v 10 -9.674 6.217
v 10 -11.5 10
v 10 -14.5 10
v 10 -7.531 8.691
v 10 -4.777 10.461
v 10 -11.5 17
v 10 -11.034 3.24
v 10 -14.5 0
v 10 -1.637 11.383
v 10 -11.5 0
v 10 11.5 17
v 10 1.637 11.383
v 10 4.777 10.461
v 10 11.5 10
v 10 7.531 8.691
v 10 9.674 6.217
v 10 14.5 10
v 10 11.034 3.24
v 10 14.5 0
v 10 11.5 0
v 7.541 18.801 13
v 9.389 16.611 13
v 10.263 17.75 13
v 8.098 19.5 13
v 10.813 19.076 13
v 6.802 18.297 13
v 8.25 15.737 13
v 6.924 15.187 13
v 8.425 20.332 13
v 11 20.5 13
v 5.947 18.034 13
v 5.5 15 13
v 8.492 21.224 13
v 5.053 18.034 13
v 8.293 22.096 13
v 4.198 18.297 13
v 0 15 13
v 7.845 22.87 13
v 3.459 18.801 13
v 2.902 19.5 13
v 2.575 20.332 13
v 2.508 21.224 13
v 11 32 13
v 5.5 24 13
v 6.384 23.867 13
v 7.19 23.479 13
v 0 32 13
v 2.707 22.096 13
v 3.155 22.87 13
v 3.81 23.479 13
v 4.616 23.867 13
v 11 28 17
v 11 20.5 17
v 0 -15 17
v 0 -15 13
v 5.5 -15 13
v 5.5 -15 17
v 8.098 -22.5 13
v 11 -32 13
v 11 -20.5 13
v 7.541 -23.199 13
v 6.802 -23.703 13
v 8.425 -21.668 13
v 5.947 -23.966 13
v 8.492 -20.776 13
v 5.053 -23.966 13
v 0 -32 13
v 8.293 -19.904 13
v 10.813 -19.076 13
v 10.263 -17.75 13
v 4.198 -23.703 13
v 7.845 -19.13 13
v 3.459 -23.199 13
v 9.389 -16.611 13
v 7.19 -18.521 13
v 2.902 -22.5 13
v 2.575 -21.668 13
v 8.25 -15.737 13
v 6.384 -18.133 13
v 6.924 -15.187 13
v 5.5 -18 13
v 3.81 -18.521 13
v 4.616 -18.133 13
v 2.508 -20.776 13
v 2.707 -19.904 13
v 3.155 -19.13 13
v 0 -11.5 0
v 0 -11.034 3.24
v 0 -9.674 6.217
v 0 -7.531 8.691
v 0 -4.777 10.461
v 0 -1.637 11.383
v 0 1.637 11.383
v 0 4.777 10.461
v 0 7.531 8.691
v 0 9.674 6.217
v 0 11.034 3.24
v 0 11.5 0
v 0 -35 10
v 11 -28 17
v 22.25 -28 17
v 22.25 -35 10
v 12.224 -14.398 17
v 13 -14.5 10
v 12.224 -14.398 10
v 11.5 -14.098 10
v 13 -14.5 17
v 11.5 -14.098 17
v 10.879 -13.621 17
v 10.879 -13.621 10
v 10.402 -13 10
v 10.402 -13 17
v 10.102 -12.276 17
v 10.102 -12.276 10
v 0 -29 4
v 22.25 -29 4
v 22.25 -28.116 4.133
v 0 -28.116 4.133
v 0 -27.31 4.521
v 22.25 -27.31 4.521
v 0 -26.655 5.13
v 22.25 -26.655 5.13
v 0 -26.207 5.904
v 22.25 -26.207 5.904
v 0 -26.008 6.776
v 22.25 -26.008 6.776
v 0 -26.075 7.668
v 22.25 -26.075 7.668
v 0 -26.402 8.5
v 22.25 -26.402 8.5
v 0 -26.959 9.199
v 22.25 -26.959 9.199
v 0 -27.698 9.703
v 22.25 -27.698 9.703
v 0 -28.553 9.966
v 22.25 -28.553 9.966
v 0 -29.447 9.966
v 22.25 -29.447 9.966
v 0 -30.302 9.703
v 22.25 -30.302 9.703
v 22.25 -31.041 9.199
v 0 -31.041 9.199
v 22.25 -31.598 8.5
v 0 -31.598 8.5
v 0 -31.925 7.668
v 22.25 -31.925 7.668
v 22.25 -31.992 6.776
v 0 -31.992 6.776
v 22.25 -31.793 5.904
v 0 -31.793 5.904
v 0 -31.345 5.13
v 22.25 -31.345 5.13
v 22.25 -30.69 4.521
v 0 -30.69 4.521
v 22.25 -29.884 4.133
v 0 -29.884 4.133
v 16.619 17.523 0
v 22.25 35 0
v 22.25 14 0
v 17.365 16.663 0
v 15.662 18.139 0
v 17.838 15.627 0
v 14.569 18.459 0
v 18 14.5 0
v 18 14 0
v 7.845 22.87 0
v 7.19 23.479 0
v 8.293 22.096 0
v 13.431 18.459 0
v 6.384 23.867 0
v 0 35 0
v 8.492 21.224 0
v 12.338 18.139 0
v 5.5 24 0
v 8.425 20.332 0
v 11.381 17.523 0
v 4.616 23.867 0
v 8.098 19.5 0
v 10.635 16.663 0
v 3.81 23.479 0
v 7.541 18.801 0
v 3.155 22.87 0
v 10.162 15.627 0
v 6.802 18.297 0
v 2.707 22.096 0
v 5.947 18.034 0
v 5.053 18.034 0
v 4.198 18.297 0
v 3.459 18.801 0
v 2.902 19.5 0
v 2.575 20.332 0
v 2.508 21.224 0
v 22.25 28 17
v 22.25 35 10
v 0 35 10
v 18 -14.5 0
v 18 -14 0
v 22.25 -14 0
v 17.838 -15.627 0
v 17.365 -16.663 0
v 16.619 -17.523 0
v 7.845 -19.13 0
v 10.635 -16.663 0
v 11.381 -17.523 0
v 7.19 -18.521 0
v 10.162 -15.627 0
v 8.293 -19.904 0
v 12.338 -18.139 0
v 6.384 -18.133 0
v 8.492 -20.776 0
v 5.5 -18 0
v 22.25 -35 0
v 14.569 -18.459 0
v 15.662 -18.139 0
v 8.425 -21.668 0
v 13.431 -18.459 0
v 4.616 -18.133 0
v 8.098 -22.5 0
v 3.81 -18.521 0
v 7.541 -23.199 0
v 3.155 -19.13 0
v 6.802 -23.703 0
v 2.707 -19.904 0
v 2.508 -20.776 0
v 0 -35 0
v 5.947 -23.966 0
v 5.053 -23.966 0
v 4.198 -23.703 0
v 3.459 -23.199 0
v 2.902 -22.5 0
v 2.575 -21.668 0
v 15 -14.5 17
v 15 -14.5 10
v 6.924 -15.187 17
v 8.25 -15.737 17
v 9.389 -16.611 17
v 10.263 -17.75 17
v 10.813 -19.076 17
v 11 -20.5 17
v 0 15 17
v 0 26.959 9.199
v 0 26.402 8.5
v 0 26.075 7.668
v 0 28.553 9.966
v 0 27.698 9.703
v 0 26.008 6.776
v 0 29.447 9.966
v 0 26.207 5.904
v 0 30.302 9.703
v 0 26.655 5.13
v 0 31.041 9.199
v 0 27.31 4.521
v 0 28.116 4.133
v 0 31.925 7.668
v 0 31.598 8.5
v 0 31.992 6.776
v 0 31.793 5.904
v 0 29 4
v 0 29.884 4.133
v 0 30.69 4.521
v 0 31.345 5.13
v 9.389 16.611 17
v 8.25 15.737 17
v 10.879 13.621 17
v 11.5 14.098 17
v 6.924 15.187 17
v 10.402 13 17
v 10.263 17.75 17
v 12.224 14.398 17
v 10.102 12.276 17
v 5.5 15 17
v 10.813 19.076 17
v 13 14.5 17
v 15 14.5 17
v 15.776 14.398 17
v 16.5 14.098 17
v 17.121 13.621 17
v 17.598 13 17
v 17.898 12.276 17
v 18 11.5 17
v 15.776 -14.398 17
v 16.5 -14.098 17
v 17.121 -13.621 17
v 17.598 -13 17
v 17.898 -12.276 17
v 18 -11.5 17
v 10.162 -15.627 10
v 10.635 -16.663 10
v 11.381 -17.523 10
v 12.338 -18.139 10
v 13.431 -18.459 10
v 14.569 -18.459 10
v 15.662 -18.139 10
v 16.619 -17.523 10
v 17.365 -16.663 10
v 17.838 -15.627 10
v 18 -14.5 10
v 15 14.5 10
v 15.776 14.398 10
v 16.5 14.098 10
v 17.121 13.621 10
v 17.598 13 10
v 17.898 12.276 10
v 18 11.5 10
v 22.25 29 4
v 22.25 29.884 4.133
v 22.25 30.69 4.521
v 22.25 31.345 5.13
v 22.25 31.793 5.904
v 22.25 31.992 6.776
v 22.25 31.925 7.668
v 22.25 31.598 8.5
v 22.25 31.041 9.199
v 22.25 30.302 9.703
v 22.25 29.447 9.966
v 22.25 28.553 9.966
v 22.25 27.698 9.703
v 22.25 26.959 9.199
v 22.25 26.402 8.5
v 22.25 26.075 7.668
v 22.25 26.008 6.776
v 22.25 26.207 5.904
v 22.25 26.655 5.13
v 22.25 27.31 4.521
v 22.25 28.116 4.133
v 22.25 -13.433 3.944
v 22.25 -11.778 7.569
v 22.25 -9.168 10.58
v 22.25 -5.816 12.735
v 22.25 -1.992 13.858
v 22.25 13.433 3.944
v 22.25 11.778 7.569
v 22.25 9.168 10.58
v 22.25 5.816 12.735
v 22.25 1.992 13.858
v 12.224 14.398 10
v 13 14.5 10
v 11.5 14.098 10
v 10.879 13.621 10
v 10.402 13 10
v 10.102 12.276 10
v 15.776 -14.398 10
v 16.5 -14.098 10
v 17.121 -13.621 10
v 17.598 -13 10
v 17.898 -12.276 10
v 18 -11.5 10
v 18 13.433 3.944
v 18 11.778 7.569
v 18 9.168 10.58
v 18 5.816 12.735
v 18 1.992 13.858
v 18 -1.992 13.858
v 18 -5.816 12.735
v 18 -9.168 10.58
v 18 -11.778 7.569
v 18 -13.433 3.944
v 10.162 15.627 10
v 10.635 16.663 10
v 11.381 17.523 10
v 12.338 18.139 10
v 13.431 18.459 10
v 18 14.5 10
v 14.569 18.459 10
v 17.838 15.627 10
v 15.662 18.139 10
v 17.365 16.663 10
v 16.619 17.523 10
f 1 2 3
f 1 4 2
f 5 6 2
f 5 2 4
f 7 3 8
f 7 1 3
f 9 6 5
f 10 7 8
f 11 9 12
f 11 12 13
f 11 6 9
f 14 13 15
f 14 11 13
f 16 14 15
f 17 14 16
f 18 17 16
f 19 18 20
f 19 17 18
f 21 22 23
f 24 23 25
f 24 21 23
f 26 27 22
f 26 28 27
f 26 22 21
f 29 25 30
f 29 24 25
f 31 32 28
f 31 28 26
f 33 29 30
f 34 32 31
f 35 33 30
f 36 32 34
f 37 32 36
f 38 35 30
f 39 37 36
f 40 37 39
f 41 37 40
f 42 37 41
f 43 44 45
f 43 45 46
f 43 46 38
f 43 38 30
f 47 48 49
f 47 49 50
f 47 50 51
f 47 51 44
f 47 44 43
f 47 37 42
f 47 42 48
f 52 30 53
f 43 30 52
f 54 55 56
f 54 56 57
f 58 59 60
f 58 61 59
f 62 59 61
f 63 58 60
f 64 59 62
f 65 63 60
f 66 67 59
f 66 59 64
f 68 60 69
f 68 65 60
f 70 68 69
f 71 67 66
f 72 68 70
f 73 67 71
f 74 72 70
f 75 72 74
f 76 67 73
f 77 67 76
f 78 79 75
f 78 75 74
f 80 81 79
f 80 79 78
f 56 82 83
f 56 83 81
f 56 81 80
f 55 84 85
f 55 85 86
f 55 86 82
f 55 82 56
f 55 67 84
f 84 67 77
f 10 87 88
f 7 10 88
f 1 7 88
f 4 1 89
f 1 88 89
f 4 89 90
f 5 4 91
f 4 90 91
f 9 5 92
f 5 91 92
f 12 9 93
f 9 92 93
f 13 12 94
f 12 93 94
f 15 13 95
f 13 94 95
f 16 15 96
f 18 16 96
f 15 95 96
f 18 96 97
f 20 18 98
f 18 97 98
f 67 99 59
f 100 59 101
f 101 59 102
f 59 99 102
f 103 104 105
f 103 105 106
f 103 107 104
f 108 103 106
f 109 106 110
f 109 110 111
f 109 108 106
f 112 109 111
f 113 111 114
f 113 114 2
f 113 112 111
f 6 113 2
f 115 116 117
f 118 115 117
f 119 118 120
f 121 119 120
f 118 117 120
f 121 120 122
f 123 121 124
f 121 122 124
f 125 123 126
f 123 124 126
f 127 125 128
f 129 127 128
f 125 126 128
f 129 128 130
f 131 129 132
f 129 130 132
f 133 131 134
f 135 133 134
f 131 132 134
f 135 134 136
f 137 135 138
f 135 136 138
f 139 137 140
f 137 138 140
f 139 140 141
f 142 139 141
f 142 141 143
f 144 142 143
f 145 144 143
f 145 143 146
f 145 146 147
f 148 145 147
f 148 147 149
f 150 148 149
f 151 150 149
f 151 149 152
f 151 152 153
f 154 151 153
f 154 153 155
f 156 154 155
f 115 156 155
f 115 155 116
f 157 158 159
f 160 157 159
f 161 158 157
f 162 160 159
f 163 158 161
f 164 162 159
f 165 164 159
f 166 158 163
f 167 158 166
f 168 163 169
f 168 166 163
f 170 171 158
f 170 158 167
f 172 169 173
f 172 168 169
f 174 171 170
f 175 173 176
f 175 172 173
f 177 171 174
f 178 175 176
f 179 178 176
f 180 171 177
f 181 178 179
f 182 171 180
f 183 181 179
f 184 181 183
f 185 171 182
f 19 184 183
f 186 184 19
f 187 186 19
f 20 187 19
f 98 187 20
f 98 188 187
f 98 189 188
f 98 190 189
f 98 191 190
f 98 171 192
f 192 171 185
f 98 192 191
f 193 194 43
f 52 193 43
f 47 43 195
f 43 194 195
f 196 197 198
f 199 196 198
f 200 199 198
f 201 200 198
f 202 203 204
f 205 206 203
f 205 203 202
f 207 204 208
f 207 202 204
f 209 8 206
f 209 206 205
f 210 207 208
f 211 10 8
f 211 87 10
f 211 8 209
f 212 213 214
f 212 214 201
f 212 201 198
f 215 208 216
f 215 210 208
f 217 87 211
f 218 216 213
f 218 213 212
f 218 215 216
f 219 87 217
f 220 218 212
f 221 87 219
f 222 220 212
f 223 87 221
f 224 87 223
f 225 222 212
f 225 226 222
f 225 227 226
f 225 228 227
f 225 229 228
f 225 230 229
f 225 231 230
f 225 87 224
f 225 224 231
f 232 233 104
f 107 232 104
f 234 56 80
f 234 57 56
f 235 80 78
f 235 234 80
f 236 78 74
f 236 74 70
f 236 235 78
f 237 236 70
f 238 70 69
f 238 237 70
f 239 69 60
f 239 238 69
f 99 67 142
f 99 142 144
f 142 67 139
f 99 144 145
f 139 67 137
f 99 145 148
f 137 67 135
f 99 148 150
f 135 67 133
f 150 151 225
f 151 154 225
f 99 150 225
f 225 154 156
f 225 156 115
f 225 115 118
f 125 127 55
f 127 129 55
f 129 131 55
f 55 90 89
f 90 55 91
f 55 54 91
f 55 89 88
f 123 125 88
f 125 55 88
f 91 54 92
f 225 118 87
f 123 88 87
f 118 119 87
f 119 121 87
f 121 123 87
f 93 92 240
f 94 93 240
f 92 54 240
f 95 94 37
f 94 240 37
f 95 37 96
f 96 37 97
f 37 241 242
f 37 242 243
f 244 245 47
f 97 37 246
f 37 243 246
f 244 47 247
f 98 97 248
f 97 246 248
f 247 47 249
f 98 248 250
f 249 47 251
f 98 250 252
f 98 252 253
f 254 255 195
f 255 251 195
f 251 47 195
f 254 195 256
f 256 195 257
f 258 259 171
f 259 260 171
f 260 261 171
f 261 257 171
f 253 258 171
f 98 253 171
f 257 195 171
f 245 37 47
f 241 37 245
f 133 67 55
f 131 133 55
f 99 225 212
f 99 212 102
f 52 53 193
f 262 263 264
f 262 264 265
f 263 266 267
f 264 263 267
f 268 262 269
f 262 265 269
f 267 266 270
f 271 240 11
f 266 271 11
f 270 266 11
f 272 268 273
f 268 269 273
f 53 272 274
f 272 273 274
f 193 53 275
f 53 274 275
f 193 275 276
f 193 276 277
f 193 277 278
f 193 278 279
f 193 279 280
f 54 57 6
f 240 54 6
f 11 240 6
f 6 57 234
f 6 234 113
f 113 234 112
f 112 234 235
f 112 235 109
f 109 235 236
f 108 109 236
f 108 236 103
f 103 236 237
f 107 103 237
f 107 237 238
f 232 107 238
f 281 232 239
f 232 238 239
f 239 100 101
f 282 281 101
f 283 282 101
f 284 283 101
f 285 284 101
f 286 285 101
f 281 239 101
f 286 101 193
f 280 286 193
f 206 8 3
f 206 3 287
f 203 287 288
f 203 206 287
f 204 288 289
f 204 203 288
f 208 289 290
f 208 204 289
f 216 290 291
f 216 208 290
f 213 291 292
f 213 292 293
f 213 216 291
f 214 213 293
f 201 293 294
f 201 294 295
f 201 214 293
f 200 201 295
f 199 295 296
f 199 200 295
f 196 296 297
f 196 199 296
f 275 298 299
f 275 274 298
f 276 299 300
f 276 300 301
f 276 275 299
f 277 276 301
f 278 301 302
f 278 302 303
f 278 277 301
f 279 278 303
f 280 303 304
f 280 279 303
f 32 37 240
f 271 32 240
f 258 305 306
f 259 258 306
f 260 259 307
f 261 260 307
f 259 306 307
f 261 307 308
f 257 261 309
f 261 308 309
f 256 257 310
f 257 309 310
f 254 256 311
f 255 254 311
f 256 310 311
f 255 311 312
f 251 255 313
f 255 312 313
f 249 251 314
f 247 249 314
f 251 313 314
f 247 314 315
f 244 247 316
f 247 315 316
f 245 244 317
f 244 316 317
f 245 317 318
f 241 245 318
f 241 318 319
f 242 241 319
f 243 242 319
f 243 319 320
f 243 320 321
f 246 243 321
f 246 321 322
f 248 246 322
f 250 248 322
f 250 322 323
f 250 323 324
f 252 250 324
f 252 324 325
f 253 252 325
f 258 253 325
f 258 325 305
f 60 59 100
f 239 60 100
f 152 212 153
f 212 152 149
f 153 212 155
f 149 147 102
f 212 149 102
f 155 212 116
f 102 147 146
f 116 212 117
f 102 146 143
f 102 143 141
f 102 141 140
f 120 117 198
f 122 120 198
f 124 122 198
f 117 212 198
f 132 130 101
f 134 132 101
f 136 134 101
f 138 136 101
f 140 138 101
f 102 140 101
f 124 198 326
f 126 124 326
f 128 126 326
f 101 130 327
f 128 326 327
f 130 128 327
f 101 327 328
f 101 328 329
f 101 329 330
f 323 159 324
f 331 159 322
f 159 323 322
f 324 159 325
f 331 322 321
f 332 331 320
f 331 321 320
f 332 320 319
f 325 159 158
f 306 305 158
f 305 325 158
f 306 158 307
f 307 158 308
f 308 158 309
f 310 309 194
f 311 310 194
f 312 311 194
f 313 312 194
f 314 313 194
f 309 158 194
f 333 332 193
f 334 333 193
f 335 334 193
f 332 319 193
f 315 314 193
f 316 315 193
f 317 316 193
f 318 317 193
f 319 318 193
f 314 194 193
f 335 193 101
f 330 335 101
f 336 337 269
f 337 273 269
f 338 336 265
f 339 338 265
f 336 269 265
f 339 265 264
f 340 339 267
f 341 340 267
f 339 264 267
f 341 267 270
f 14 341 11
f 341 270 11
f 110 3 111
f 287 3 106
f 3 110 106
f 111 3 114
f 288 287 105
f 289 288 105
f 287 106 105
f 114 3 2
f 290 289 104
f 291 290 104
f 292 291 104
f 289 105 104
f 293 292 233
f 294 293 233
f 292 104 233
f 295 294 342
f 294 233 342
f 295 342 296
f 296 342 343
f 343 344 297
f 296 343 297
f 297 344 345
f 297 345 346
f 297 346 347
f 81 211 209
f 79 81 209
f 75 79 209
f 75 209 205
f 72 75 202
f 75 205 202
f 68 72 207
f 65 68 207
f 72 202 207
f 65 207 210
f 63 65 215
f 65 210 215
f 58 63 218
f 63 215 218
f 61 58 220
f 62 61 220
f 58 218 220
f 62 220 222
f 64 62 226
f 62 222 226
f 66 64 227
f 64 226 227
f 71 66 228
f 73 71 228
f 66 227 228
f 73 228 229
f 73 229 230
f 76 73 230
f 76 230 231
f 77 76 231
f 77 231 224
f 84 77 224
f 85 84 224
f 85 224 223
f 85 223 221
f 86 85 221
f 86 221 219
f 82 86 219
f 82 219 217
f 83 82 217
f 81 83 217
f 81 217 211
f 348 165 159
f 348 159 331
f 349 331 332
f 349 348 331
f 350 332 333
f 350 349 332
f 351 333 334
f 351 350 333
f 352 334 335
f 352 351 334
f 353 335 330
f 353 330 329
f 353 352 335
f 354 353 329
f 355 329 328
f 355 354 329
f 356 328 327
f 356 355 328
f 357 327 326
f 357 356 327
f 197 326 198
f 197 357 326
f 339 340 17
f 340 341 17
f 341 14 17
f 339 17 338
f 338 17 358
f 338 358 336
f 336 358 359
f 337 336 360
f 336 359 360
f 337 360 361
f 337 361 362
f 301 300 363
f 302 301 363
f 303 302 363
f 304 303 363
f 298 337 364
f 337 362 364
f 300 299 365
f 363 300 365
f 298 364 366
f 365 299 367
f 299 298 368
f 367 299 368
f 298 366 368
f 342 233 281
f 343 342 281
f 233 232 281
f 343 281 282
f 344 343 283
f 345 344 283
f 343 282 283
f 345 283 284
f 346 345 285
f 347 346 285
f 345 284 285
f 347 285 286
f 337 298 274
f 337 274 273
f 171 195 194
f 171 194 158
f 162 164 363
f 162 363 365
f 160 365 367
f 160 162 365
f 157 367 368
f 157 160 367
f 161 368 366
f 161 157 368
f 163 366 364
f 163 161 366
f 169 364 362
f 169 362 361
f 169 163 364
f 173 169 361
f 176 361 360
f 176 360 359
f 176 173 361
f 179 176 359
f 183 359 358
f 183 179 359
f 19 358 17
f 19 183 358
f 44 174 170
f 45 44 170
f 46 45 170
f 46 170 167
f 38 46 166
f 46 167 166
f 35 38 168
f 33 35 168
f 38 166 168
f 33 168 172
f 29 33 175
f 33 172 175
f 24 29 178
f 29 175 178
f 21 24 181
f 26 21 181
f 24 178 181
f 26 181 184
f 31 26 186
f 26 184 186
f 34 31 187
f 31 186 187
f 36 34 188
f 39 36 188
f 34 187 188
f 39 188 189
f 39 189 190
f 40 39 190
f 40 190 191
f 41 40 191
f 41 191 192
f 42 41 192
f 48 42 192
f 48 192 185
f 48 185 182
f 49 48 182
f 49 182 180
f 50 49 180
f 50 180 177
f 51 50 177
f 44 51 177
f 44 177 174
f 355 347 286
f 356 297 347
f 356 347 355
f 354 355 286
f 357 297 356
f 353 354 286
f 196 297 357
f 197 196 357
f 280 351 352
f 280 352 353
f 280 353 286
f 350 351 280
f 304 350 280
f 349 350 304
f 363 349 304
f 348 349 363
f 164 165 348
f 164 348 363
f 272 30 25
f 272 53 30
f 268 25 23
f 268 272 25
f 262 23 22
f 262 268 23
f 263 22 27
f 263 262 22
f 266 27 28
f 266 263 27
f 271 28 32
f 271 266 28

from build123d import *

# Parameters (mm, degrees)
BOSS_EXTRUDE1_DEPTH = 10
BOSS_EXTRUDE2_DEPTH = 12.25
SKETCH3_W           = 22.25
SKETCH3_H           = 8
CUT_EXTRUDE1_DEPTH  = 80
SKETCH8_R           = 3
CUT_EXTRUDE4_DEPTH  = 25
CUT_EXTRUDE2_DEPTH  = 10
SKETCH7_W           = 8
SKETCH7_H           = 29
CUT_EXTRUDE3_DEPTH  = 10
FILLET1_R           = 3
SKETCH19_R          = 3
CUT_EXTRUDE5_DEPTH  = 20
SKETCH21_W          = 4
SKETCH21_H          = 20
CUT_EXTRUDE6_DEPTH  = 11
FILLET2_R           = 5.5
CHAMFER1_SIZE       = 7


with BuildPart() as part:
    # Sketch1 → Boss-Extrude1 (new body)
    with BuildSketch(Plane(origin=(0, 0, 0), x_dir=(0, 0, -1), z_dir=(1, 0, 0))):
        with BuildLine():
            Line((0, 11.5), (0, 35))
            Line((0, 35), (-25, 35))
            Line((-25, 35), (-25, -35))
            Line((-25, -35), (0, -35))
            Line((0, -35), (0, -11.5))
            ThreePointArc((0, -11.5), (-11.5, 0), (0, 11.5))
        make_face()
    extrude(amount=BOSS_EXTRUDE1_DEPTH)

    # Sketch2 → Boss-Extrude2 (add)
    with BuildSketch(Plane(origin=(10, 0, 0), x_dir=(0, 0, -1), z_dir=(1, 0, 0))):
        with BuildLine():
            Line((0, -14), (0, -35))
            Line((0, -35), (-25, -35))
            Line((-25, -35), (-25, 35))
            Line((-25, 35), (0, 35))
            Line((0, 35), (0, 14))
            ThreePointArc((0, 14), (-14, 0), (0, -14))
        make_face()
    extrude(amount=BOSS_EXTRUDE2_DEPTH)

    # Sketch3 → Cut-Extrude1 (cut)
    with BuildSketch(Plane.XZ.offset(35)):
        with Locations((11.125, 21)):
            Rectangle(SKETCH3_W, SKETCH3_H)
    extrude(amount=-CUT_EXTRUDE1_DEPTH, mode=Mode.SUBTRACT)

    # Sketch8 → Cut-Extrude4 (cut)
    with BuildSketch(Plane(origin=(22.25, 0, 0), x_dir=(0, 0, -1), z_dir=(1, 0, 0))):
        with Locations((-7, -29)):
            Circle(SKETCH8_R)
        with Locations((-7, 29)):
            Circle(SKETCH8_R)
    extrude(amount=-CUT_EXTRUDE4_DEPTH, mode=Mode.SUBTRACT)

    # Sketch6 → Cut-Extrude2 (cut)
    with BuildSketch(Plane(origin=(0, 0, 0), x_dir=(-1, 0, 0), z_dir=(0, 0, -1))):
        with BuildLine():
            Line((-18, -14.5), (-18, 14.5))
            ThreePointArc((-18, 14.5), (-14, 18.5), (-10, 14.5))
            Line((-10, 14.5), (-10, -14.5))
            ThreePointArc((-10, -14.5), (-14, -18.5), (-18, -14.5))
        make_face()
    extrude(amount=-CUT_EXTRUDE2_DEPTH, mode=Mode.SUBTRACT)

    # Sketch7 → Cut-Extrude3 (cut)
    with BuildSketch(Plane(origin=(0, 0, 10), x_dir=(-1, 0, 0), z_dir=(0, 0, -1))):
        with Locations((-14, 0)):
            Rectangle(SKETCH7_W, SKETCH7_H)
    extrude(amount=-CUT_EXTRUDE3_DEPTH, mode=Mode.SUBTRACT)

    # Fillet1
    fillet1_edges = [part.edges().sort_by_distance(p)[0] for p in [
        (18, 14.5, 13.5),
        (18, -14.5, 13.5),
        (10, 14.5, 13.5),
        (10, -14.5, 13.5),
    ]]
    fillet(fillet1_edges, radius=FILLET1_R)

    # Sketch19 → Cut-Extrude5 (cut)
    with BuildSketch(Plane(origin=(0, 0, 0), x_dir=(-1, 0, 0), z_dir=(0, 0, -1))):
        with Locations(Location((-5.5, -21, 0), (0, 0, 90))):
            Circle(SKETCH19_R)
        with Locations(Location((-5.5, 21, 0), (0, 0, 90))):
            Circle(SKETCH19_R)
    extrude(amount=-CUT_EXTRUDE5_DEPTH, mode=Mode.SUBTRACT)

    # Sketch21 → Cut-Extrude6 (cut)
    with BuildSketch(Plane.ZY):
        with Locations((15, -25)):
            Rectangle(SKETCH21_W, SKETCH21_H)
        with Locations((15, 25)):
            Rectangle(SKETCH21_W, SKETCH21_H)
    extrude(amount=-CUT_EXTRUDE6_DEPTH, mode=Mode.SUBTRACT)

    # Fillet2
    fillet2_edges = [part.edges().sort_by_distance(p)[0] for p in [
        (11, -15, 15),
        (11, 15, 15),
    ]]
    fillet(fillet2_edges, radius=FILLET2_R)

    # Chamfer1
    chamfer1_edges = [part.edges().sort_by_distance(p)[0] for p in [
        (16.625, -35, 17),
        (16.625, 35, 17),
    ]]
    chamfer(chamfer1_edges, length=CHAMFER1_SIZE)


solid = part.part
